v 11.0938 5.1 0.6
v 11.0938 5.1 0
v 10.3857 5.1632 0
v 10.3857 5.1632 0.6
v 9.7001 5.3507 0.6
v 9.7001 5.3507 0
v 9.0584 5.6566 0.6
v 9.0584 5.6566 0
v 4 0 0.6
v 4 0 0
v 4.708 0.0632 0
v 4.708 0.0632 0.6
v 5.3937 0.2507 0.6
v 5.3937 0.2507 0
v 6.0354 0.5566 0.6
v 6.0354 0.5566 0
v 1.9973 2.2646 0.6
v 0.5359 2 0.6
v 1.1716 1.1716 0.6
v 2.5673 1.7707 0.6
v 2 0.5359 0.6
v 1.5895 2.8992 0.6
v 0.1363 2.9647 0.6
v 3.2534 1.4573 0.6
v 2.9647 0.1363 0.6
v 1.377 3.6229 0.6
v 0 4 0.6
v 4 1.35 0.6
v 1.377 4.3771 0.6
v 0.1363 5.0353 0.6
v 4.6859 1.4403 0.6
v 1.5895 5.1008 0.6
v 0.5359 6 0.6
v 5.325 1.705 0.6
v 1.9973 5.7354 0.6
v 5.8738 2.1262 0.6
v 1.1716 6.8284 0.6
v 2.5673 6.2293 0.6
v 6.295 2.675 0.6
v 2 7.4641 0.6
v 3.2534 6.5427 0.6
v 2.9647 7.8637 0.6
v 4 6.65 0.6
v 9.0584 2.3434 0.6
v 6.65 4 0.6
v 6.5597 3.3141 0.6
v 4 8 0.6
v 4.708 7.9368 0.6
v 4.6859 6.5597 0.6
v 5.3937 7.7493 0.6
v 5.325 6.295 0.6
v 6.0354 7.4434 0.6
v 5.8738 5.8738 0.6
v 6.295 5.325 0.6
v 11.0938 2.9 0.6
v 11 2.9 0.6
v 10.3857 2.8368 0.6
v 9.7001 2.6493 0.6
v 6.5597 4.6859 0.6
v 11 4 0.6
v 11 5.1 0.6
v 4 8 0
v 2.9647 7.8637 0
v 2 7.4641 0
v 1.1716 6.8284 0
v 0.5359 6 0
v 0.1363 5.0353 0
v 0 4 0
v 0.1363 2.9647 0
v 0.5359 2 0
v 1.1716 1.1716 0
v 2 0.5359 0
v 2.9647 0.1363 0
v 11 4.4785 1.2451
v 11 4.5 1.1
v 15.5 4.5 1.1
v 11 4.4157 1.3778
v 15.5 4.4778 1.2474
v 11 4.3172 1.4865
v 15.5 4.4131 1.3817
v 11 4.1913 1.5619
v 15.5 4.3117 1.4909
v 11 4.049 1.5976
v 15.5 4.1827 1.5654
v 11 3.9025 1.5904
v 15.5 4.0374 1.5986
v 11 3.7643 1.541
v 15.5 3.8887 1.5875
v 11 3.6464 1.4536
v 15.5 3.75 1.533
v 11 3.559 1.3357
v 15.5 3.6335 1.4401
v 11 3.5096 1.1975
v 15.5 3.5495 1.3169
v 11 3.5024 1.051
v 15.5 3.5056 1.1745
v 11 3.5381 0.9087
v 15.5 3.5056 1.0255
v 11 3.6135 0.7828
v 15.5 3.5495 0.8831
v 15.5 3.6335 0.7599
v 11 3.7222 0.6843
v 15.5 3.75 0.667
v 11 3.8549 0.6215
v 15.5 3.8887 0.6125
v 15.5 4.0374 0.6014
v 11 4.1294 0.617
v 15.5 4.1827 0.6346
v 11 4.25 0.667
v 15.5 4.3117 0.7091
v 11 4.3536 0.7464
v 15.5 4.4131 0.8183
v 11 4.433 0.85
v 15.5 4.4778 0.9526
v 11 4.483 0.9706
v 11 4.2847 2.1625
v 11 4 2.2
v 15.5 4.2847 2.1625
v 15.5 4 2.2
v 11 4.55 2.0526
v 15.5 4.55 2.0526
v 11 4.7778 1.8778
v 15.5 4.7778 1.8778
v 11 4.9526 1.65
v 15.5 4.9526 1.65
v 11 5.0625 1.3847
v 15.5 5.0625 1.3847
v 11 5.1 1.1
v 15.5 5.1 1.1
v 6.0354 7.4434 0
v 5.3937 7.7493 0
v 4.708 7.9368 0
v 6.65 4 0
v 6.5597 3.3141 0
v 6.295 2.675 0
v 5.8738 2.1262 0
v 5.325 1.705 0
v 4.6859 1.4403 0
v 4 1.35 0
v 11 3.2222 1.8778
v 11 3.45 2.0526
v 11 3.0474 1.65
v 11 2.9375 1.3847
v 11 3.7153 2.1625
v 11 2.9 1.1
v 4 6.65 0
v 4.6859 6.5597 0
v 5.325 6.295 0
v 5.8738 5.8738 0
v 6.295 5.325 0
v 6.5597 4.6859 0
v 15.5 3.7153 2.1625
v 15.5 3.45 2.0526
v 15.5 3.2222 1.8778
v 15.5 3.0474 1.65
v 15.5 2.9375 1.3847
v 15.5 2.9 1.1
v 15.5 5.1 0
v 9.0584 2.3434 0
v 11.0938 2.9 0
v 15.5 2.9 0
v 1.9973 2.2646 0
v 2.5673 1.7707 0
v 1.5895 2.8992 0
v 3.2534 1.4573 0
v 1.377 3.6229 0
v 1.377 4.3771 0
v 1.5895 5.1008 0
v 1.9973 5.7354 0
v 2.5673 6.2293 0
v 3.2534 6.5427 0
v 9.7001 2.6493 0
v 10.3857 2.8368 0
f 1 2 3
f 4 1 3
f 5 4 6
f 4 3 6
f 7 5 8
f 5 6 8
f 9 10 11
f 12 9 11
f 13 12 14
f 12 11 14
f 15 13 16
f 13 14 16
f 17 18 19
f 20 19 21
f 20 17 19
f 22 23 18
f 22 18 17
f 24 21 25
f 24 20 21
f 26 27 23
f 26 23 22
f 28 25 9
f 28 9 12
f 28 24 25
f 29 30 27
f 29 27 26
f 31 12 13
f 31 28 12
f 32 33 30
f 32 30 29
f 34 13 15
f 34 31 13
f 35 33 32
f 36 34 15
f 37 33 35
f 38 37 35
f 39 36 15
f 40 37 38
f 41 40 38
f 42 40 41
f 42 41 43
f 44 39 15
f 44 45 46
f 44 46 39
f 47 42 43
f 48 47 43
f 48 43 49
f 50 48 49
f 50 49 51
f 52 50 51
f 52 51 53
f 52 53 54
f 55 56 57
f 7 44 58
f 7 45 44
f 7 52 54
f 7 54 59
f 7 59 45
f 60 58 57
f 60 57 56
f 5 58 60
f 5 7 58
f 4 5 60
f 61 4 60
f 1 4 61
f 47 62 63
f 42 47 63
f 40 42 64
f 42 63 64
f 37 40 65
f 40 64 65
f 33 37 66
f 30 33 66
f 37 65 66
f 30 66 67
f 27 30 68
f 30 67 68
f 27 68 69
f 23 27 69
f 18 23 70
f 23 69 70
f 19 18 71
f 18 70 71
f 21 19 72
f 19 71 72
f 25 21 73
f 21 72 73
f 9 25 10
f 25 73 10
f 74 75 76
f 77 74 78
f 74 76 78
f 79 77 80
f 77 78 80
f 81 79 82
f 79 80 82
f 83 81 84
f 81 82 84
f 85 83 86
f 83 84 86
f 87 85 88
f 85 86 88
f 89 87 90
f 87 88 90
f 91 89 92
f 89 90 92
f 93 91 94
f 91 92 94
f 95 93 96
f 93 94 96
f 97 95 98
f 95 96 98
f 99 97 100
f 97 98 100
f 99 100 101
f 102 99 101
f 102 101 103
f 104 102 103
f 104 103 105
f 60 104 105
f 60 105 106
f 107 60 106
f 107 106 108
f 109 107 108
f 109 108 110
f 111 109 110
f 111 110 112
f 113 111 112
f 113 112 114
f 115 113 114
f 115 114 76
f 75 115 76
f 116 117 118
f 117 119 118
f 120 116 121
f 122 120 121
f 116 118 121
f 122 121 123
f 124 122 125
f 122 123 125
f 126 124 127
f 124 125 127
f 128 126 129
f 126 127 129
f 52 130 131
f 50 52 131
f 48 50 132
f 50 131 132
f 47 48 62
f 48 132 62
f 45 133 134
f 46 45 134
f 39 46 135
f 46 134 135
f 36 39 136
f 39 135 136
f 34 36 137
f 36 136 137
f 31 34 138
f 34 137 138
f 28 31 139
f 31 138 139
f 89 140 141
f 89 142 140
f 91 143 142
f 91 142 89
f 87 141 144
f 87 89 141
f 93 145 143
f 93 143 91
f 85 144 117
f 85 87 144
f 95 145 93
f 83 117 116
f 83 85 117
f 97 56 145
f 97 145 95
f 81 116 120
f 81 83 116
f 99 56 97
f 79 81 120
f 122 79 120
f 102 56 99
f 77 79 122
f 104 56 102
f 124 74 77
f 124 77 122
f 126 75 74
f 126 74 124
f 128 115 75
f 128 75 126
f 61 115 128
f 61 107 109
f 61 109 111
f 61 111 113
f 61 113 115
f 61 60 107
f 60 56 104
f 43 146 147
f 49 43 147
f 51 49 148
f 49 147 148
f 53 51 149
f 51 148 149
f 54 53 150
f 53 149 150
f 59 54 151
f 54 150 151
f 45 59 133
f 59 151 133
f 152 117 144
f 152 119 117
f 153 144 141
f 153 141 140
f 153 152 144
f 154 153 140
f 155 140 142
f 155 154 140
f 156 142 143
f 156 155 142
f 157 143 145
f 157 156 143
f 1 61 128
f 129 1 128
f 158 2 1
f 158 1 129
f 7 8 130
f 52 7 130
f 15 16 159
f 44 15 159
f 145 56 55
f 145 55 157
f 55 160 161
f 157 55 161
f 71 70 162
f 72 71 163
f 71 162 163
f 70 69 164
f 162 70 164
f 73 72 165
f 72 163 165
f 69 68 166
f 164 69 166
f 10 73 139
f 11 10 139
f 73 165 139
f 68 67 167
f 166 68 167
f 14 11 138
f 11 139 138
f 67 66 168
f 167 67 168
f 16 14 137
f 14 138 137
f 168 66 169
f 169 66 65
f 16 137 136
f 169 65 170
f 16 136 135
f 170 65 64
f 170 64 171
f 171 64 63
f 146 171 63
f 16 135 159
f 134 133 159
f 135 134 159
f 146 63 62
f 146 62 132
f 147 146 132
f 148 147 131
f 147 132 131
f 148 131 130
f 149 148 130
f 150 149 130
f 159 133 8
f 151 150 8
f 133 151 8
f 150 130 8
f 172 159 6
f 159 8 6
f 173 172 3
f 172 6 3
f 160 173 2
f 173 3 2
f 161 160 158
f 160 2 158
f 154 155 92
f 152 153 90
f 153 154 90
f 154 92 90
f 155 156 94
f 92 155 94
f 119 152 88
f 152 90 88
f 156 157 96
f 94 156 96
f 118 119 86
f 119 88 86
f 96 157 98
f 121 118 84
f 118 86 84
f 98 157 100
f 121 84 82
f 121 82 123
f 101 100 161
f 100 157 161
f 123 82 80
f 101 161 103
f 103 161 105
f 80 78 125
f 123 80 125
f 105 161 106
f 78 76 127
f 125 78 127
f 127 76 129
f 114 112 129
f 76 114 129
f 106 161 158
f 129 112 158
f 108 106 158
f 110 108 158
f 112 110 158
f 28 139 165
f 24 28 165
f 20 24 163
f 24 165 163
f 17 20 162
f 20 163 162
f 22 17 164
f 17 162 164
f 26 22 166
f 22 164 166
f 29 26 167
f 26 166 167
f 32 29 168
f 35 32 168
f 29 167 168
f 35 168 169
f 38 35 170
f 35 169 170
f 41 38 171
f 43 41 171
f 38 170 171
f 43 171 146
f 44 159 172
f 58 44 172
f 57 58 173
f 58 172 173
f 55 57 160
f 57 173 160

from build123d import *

# Parameters (mm, degrees)
F1_DEPTH = 0.6
F2_W     = 4.5
F2_H     = 2.2
F3_DEPTH = 1.6
F4_R     = 1.09999
F5_R     = 0.5
F6_DEPTH = 25


# Not quite as in the source:
# - a fillet or chamfer is up to 0.001 mm smaller than in the source, because OpenCascade refuses the exact size


with BuildPart() as f1:
    # F0 (on Top) → F1 (new body)
    with BuildSketch(Plane.XY):
        with BuildLine():
            Line((11.0937791562, 2.9), (15.5, 2.9))
            Line((15.5, 2.9), (15.5, 5.1))
            Line((15.5, 5.1), (11.0937791562, 5.1))
            ThreePointArc((11.0937791562, 5.1), (10.0387329979, 5.2416483307), (9.0584096032, 5.656561198))
            Line((9.0584096032, 5.656561198), (6.035369553, 7.443438802))
            ThreePointArc((6.035369553, 7.443438802), (5.0550461583, 7.8583516693), (4, 8))
            Line((4, 8), (4, 6.65))
            ThreePointArc((4, 6.65), (5.8738329701, 5.8738329701), (6.65, 4))
            ThreePointArc((6.65, 4), (5.8738329701, 2.1261670299), (4, 1.35))
            Line((4, 1.35), (4, 0))
            ThreePointArc((4, 0), (5.0550461583, 0.1416483307), (6.035369553, 0.556561198))
            Line((6.035369553, 0.556561198), (9.0584096032, 2.343438802))
            ThreePointArc((9.0584096032, 2.343438802), (10.0387329979, 2.7583516693), (11.0937791562, 2.9))
        make_face()
        with BuildLine():
            ThreePointArc((0, 4), (1.1715728753, 1.1715728753), (4, 0))
            Line((4, 0), (4, 1.35))
            ThreePointArc((4, 1.35), (1.35, 4), (4, 6.65))
            Line((4, 6.65), (4, 8))
            ThreePointArc((4, 8), (1.1715728753, 6.8284271247), (0, 4))
        make_face()
    extrude(amount=F1_DEPTH)

    # F2 (on face) → F3 (join)
    with BuildSketch(Plane.XY.offset(0.6)):
        with Locations((13.25, 4)):
            Rectangle(F2_W, F2_H)
    extrude(amount=F3_DEPTH)

    # F4 (radius 1.1 in the source; OpenCascade refuses exactly that, so slightly less here)
    f4_edges = [f1.edges().sort_by_distance(p)[0] for p in [
        (13.25, 5.1, 2.2),
        (13.25, 2.9, 2.2),
    ]]
    fillet(f4_edges, radius=F4_R)

    # F5 (on face) → F6 (cut)
    with BuildSketch(Plane.YZ.offset(15.5)):
        with Locations((4, 1.1)):
            Circle(F5_R)
    extrude(amount=-F6_DEPTH, mode=Mode.SUBTRACT)


solid = f1.part
